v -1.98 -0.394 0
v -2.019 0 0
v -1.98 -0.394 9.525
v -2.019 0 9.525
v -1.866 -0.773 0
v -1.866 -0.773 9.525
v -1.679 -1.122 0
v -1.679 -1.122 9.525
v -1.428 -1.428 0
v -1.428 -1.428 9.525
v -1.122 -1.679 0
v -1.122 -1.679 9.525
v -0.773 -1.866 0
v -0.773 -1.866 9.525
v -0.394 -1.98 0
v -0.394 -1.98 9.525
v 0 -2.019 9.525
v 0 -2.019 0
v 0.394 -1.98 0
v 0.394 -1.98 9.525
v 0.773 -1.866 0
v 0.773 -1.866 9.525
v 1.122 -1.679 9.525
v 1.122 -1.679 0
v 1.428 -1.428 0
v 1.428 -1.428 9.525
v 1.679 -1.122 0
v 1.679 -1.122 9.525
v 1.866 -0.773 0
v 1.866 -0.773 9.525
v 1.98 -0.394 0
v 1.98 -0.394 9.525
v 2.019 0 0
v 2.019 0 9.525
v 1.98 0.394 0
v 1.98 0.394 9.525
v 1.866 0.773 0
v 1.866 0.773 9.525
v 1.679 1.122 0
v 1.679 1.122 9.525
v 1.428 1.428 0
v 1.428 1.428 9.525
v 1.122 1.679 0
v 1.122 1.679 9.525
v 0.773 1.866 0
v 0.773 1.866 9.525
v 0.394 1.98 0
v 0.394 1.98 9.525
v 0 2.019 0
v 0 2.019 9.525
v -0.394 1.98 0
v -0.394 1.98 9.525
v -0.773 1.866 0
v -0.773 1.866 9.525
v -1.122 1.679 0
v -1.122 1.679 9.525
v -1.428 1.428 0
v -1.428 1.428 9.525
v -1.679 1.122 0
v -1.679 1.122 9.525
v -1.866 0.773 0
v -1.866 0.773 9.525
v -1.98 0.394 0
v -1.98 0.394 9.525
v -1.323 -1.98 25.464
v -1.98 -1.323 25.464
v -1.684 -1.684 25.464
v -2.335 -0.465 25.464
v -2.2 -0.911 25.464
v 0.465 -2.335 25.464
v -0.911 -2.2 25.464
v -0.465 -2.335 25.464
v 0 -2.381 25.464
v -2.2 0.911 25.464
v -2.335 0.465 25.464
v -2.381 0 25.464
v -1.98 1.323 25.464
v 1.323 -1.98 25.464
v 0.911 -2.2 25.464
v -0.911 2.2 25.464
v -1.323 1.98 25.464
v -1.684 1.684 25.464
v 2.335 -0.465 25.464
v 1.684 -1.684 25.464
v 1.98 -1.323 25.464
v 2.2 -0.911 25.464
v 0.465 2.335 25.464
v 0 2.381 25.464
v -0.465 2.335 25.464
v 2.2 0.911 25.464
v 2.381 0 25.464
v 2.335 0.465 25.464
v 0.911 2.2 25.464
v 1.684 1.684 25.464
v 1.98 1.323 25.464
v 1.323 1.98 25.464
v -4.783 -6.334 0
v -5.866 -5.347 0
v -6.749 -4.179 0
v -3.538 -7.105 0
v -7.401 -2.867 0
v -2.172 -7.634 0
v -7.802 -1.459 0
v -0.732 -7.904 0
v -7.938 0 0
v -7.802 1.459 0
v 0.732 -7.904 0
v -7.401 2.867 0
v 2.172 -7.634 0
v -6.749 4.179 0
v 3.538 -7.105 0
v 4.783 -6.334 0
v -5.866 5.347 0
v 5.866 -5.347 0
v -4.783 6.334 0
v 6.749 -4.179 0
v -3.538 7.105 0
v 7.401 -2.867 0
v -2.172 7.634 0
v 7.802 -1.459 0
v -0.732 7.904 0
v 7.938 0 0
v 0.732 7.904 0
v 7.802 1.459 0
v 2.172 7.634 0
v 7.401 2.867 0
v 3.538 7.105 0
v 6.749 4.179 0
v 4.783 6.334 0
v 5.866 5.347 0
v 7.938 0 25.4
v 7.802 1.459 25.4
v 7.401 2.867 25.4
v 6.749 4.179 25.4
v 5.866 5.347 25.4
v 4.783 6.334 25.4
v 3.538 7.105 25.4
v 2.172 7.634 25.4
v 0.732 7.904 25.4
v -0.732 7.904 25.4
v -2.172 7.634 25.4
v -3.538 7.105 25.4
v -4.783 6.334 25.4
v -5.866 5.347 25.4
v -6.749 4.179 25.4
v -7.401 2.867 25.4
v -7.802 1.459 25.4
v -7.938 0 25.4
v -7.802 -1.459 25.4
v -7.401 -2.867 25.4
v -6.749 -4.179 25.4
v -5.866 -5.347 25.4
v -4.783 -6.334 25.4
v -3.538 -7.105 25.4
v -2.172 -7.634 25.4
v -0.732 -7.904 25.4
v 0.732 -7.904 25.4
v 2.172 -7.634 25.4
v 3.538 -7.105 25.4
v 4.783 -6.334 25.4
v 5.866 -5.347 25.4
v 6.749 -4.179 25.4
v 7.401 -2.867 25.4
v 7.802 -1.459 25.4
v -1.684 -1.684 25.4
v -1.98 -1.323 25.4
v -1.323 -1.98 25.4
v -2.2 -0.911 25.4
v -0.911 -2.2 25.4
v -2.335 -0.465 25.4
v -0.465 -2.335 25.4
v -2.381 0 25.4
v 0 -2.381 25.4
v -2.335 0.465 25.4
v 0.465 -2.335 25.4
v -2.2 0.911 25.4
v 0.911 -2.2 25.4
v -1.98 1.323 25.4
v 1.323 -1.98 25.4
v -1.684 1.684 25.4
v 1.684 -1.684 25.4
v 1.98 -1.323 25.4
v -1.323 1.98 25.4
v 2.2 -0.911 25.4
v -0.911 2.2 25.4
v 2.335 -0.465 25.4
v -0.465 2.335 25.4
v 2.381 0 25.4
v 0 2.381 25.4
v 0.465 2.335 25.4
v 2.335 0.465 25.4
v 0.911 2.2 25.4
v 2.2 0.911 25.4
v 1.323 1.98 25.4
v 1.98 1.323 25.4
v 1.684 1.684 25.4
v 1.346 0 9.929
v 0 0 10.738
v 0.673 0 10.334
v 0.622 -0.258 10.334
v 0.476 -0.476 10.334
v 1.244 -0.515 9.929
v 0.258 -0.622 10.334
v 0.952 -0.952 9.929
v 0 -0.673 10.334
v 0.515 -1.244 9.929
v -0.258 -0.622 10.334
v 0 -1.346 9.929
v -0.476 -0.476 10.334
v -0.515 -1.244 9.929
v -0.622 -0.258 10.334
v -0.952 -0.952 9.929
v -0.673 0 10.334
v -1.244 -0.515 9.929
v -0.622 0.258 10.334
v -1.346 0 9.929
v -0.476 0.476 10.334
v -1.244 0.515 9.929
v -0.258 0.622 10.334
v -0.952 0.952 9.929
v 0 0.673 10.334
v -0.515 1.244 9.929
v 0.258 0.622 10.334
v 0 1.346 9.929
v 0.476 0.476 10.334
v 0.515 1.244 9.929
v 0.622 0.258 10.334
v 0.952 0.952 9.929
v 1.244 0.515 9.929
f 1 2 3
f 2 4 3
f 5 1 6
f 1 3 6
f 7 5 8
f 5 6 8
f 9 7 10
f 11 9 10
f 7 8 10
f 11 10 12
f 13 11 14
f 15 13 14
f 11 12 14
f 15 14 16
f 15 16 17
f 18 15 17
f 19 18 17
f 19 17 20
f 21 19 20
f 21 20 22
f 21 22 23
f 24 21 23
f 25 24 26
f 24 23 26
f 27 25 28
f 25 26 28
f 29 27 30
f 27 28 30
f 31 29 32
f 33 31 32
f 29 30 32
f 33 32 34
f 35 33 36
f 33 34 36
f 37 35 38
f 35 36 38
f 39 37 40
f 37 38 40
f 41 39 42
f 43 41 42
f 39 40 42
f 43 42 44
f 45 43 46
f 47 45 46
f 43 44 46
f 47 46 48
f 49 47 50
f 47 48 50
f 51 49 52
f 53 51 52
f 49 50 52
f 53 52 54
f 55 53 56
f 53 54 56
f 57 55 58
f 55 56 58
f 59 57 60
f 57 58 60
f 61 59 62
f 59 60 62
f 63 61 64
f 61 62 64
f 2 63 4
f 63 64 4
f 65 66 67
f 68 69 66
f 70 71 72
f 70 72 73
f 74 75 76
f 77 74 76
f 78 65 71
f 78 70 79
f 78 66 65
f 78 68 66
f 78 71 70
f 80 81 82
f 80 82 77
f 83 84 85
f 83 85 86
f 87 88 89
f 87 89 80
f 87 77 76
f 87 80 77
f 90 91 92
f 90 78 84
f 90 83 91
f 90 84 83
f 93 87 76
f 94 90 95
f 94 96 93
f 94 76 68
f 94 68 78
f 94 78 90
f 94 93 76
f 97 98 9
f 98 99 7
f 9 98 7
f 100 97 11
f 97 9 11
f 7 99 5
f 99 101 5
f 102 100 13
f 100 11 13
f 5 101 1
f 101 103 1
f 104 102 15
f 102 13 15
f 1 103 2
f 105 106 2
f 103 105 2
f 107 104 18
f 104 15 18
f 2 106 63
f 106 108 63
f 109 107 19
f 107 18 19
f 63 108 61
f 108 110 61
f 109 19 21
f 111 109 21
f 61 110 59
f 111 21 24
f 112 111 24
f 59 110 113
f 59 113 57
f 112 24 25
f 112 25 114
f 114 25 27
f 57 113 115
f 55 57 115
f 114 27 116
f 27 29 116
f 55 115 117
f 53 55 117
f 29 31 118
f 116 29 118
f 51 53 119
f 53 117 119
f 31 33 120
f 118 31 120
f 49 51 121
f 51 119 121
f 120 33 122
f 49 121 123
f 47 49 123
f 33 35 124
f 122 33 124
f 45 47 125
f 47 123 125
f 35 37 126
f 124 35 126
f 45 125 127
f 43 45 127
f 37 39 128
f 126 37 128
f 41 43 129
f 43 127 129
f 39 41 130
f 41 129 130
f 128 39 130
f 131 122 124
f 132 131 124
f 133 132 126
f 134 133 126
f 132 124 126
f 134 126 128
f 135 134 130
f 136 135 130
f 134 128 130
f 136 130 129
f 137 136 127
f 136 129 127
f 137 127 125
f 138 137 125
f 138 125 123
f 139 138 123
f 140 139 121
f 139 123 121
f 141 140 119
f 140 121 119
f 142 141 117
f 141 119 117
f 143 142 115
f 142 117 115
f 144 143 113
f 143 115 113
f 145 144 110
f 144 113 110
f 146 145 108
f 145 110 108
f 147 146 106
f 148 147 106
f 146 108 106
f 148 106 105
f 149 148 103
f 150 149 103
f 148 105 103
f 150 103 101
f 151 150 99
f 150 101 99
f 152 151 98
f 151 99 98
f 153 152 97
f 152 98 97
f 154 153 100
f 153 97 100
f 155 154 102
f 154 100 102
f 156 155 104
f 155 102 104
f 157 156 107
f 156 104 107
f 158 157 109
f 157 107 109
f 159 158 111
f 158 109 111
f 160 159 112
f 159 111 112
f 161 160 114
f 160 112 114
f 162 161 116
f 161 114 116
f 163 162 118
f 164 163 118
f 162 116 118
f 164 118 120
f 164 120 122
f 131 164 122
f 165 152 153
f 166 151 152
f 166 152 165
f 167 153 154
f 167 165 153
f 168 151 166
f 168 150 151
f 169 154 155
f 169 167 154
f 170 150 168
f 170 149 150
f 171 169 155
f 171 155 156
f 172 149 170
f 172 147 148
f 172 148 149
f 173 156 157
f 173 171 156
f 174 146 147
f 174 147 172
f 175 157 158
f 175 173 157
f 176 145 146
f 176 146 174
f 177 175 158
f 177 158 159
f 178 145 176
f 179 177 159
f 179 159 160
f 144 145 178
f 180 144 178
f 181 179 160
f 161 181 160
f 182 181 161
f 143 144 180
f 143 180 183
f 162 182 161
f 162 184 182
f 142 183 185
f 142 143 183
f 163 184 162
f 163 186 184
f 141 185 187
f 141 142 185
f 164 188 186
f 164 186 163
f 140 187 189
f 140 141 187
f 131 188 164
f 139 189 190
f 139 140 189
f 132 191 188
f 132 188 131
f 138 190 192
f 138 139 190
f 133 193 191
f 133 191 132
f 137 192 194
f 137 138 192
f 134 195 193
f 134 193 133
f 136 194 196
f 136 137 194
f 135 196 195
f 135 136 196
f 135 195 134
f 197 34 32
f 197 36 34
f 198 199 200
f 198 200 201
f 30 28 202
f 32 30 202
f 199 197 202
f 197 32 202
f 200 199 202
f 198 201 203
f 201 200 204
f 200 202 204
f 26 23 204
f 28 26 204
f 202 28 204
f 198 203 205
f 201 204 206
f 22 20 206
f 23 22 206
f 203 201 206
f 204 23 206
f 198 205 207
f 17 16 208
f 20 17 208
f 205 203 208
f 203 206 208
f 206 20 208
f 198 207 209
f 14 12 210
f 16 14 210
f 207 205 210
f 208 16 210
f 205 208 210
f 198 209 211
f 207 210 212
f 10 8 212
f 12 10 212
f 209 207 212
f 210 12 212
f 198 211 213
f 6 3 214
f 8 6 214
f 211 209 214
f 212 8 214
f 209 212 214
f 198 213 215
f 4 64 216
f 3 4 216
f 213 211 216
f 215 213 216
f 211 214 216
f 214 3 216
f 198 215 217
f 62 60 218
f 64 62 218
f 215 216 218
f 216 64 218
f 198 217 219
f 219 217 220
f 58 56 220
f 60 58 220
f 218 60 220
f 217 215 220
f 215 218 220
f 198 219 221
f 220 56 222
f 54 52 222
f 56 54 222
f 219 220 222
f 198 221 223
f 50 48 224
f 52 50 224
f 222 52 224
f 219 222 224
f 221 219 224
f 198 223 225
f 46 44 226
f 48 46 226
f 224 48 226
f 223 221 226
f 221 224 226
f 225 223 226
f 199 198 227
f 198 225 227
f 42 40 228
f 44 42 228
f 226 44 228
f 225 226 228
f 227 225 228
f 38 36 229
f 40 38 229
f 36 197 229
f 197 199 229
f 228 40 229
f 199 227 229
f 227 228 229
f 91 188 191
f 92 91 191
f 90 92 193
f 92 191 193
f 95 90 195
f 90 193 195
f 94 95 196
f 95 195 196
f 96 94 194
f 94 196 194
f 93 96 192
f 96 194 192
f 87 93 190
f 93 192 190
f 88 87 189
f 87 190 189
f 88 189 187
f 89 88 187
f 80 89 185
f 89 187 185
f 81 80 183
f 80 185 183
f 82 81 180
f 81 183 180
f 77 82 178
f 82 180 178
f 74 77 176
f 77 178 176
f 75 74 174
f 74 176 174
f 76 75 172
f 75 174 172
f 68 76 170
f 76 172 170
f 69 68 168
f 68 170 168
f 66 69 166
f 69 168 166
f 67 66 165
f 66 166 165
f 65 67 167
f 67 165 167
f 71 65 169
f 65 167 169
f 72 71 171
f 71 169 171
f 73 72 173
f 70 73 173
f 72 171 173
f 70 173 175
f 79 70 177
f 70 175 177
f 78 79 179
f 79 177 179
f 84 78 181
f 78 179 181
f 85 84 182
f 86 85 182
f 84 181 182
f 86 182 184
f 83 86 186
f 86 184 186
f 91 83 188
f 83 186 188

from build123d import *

# Parameters (mm, degrees)
F0_R     = 7.9375
F1_DEPTH = 25.4
F4_D     = 4.0386
F4_DEPTH = 9.525
F4_TIP   = 1.213317848
F2_R     = 2.38125
F5_DEPTH = 0.0635


# Not quite as in the source:
# - a length typed as a fraction of an inch, garbled in the dataset ("3 / 203.2 mm" for 3/8 in), is restored


with BuildPart() as f1:
    # F0 (on Top) → F1 (new body)
    with BuildSketch(Plane.XY):
        Circle(F0_R)
    extrude(amount=F1_DEPTH)

    # F4
    with Locations(Plane(origin=(0, 0, 0), x_dir=(1, 0, 0), z_dir=(0, 0, -1))):
        with Locations((0, 0)):
            Hole(F4_D / 2, depth=F4_DEPTH)
            with Locations((0, 0, -(F4_DEPTH + F4_TIP / 2))):  # 118° drill point
                Cone(0, F4_D / 2, F4_TIP, mode=Mode.SUBTRACT)

    # F2 (on face) → F5 (join)
    with BuildSketch(Plane.XY.offset(25.4)):
        Circle(F2_R)
    extrude(amount=F5_DEPTH)


solid = f1.part
